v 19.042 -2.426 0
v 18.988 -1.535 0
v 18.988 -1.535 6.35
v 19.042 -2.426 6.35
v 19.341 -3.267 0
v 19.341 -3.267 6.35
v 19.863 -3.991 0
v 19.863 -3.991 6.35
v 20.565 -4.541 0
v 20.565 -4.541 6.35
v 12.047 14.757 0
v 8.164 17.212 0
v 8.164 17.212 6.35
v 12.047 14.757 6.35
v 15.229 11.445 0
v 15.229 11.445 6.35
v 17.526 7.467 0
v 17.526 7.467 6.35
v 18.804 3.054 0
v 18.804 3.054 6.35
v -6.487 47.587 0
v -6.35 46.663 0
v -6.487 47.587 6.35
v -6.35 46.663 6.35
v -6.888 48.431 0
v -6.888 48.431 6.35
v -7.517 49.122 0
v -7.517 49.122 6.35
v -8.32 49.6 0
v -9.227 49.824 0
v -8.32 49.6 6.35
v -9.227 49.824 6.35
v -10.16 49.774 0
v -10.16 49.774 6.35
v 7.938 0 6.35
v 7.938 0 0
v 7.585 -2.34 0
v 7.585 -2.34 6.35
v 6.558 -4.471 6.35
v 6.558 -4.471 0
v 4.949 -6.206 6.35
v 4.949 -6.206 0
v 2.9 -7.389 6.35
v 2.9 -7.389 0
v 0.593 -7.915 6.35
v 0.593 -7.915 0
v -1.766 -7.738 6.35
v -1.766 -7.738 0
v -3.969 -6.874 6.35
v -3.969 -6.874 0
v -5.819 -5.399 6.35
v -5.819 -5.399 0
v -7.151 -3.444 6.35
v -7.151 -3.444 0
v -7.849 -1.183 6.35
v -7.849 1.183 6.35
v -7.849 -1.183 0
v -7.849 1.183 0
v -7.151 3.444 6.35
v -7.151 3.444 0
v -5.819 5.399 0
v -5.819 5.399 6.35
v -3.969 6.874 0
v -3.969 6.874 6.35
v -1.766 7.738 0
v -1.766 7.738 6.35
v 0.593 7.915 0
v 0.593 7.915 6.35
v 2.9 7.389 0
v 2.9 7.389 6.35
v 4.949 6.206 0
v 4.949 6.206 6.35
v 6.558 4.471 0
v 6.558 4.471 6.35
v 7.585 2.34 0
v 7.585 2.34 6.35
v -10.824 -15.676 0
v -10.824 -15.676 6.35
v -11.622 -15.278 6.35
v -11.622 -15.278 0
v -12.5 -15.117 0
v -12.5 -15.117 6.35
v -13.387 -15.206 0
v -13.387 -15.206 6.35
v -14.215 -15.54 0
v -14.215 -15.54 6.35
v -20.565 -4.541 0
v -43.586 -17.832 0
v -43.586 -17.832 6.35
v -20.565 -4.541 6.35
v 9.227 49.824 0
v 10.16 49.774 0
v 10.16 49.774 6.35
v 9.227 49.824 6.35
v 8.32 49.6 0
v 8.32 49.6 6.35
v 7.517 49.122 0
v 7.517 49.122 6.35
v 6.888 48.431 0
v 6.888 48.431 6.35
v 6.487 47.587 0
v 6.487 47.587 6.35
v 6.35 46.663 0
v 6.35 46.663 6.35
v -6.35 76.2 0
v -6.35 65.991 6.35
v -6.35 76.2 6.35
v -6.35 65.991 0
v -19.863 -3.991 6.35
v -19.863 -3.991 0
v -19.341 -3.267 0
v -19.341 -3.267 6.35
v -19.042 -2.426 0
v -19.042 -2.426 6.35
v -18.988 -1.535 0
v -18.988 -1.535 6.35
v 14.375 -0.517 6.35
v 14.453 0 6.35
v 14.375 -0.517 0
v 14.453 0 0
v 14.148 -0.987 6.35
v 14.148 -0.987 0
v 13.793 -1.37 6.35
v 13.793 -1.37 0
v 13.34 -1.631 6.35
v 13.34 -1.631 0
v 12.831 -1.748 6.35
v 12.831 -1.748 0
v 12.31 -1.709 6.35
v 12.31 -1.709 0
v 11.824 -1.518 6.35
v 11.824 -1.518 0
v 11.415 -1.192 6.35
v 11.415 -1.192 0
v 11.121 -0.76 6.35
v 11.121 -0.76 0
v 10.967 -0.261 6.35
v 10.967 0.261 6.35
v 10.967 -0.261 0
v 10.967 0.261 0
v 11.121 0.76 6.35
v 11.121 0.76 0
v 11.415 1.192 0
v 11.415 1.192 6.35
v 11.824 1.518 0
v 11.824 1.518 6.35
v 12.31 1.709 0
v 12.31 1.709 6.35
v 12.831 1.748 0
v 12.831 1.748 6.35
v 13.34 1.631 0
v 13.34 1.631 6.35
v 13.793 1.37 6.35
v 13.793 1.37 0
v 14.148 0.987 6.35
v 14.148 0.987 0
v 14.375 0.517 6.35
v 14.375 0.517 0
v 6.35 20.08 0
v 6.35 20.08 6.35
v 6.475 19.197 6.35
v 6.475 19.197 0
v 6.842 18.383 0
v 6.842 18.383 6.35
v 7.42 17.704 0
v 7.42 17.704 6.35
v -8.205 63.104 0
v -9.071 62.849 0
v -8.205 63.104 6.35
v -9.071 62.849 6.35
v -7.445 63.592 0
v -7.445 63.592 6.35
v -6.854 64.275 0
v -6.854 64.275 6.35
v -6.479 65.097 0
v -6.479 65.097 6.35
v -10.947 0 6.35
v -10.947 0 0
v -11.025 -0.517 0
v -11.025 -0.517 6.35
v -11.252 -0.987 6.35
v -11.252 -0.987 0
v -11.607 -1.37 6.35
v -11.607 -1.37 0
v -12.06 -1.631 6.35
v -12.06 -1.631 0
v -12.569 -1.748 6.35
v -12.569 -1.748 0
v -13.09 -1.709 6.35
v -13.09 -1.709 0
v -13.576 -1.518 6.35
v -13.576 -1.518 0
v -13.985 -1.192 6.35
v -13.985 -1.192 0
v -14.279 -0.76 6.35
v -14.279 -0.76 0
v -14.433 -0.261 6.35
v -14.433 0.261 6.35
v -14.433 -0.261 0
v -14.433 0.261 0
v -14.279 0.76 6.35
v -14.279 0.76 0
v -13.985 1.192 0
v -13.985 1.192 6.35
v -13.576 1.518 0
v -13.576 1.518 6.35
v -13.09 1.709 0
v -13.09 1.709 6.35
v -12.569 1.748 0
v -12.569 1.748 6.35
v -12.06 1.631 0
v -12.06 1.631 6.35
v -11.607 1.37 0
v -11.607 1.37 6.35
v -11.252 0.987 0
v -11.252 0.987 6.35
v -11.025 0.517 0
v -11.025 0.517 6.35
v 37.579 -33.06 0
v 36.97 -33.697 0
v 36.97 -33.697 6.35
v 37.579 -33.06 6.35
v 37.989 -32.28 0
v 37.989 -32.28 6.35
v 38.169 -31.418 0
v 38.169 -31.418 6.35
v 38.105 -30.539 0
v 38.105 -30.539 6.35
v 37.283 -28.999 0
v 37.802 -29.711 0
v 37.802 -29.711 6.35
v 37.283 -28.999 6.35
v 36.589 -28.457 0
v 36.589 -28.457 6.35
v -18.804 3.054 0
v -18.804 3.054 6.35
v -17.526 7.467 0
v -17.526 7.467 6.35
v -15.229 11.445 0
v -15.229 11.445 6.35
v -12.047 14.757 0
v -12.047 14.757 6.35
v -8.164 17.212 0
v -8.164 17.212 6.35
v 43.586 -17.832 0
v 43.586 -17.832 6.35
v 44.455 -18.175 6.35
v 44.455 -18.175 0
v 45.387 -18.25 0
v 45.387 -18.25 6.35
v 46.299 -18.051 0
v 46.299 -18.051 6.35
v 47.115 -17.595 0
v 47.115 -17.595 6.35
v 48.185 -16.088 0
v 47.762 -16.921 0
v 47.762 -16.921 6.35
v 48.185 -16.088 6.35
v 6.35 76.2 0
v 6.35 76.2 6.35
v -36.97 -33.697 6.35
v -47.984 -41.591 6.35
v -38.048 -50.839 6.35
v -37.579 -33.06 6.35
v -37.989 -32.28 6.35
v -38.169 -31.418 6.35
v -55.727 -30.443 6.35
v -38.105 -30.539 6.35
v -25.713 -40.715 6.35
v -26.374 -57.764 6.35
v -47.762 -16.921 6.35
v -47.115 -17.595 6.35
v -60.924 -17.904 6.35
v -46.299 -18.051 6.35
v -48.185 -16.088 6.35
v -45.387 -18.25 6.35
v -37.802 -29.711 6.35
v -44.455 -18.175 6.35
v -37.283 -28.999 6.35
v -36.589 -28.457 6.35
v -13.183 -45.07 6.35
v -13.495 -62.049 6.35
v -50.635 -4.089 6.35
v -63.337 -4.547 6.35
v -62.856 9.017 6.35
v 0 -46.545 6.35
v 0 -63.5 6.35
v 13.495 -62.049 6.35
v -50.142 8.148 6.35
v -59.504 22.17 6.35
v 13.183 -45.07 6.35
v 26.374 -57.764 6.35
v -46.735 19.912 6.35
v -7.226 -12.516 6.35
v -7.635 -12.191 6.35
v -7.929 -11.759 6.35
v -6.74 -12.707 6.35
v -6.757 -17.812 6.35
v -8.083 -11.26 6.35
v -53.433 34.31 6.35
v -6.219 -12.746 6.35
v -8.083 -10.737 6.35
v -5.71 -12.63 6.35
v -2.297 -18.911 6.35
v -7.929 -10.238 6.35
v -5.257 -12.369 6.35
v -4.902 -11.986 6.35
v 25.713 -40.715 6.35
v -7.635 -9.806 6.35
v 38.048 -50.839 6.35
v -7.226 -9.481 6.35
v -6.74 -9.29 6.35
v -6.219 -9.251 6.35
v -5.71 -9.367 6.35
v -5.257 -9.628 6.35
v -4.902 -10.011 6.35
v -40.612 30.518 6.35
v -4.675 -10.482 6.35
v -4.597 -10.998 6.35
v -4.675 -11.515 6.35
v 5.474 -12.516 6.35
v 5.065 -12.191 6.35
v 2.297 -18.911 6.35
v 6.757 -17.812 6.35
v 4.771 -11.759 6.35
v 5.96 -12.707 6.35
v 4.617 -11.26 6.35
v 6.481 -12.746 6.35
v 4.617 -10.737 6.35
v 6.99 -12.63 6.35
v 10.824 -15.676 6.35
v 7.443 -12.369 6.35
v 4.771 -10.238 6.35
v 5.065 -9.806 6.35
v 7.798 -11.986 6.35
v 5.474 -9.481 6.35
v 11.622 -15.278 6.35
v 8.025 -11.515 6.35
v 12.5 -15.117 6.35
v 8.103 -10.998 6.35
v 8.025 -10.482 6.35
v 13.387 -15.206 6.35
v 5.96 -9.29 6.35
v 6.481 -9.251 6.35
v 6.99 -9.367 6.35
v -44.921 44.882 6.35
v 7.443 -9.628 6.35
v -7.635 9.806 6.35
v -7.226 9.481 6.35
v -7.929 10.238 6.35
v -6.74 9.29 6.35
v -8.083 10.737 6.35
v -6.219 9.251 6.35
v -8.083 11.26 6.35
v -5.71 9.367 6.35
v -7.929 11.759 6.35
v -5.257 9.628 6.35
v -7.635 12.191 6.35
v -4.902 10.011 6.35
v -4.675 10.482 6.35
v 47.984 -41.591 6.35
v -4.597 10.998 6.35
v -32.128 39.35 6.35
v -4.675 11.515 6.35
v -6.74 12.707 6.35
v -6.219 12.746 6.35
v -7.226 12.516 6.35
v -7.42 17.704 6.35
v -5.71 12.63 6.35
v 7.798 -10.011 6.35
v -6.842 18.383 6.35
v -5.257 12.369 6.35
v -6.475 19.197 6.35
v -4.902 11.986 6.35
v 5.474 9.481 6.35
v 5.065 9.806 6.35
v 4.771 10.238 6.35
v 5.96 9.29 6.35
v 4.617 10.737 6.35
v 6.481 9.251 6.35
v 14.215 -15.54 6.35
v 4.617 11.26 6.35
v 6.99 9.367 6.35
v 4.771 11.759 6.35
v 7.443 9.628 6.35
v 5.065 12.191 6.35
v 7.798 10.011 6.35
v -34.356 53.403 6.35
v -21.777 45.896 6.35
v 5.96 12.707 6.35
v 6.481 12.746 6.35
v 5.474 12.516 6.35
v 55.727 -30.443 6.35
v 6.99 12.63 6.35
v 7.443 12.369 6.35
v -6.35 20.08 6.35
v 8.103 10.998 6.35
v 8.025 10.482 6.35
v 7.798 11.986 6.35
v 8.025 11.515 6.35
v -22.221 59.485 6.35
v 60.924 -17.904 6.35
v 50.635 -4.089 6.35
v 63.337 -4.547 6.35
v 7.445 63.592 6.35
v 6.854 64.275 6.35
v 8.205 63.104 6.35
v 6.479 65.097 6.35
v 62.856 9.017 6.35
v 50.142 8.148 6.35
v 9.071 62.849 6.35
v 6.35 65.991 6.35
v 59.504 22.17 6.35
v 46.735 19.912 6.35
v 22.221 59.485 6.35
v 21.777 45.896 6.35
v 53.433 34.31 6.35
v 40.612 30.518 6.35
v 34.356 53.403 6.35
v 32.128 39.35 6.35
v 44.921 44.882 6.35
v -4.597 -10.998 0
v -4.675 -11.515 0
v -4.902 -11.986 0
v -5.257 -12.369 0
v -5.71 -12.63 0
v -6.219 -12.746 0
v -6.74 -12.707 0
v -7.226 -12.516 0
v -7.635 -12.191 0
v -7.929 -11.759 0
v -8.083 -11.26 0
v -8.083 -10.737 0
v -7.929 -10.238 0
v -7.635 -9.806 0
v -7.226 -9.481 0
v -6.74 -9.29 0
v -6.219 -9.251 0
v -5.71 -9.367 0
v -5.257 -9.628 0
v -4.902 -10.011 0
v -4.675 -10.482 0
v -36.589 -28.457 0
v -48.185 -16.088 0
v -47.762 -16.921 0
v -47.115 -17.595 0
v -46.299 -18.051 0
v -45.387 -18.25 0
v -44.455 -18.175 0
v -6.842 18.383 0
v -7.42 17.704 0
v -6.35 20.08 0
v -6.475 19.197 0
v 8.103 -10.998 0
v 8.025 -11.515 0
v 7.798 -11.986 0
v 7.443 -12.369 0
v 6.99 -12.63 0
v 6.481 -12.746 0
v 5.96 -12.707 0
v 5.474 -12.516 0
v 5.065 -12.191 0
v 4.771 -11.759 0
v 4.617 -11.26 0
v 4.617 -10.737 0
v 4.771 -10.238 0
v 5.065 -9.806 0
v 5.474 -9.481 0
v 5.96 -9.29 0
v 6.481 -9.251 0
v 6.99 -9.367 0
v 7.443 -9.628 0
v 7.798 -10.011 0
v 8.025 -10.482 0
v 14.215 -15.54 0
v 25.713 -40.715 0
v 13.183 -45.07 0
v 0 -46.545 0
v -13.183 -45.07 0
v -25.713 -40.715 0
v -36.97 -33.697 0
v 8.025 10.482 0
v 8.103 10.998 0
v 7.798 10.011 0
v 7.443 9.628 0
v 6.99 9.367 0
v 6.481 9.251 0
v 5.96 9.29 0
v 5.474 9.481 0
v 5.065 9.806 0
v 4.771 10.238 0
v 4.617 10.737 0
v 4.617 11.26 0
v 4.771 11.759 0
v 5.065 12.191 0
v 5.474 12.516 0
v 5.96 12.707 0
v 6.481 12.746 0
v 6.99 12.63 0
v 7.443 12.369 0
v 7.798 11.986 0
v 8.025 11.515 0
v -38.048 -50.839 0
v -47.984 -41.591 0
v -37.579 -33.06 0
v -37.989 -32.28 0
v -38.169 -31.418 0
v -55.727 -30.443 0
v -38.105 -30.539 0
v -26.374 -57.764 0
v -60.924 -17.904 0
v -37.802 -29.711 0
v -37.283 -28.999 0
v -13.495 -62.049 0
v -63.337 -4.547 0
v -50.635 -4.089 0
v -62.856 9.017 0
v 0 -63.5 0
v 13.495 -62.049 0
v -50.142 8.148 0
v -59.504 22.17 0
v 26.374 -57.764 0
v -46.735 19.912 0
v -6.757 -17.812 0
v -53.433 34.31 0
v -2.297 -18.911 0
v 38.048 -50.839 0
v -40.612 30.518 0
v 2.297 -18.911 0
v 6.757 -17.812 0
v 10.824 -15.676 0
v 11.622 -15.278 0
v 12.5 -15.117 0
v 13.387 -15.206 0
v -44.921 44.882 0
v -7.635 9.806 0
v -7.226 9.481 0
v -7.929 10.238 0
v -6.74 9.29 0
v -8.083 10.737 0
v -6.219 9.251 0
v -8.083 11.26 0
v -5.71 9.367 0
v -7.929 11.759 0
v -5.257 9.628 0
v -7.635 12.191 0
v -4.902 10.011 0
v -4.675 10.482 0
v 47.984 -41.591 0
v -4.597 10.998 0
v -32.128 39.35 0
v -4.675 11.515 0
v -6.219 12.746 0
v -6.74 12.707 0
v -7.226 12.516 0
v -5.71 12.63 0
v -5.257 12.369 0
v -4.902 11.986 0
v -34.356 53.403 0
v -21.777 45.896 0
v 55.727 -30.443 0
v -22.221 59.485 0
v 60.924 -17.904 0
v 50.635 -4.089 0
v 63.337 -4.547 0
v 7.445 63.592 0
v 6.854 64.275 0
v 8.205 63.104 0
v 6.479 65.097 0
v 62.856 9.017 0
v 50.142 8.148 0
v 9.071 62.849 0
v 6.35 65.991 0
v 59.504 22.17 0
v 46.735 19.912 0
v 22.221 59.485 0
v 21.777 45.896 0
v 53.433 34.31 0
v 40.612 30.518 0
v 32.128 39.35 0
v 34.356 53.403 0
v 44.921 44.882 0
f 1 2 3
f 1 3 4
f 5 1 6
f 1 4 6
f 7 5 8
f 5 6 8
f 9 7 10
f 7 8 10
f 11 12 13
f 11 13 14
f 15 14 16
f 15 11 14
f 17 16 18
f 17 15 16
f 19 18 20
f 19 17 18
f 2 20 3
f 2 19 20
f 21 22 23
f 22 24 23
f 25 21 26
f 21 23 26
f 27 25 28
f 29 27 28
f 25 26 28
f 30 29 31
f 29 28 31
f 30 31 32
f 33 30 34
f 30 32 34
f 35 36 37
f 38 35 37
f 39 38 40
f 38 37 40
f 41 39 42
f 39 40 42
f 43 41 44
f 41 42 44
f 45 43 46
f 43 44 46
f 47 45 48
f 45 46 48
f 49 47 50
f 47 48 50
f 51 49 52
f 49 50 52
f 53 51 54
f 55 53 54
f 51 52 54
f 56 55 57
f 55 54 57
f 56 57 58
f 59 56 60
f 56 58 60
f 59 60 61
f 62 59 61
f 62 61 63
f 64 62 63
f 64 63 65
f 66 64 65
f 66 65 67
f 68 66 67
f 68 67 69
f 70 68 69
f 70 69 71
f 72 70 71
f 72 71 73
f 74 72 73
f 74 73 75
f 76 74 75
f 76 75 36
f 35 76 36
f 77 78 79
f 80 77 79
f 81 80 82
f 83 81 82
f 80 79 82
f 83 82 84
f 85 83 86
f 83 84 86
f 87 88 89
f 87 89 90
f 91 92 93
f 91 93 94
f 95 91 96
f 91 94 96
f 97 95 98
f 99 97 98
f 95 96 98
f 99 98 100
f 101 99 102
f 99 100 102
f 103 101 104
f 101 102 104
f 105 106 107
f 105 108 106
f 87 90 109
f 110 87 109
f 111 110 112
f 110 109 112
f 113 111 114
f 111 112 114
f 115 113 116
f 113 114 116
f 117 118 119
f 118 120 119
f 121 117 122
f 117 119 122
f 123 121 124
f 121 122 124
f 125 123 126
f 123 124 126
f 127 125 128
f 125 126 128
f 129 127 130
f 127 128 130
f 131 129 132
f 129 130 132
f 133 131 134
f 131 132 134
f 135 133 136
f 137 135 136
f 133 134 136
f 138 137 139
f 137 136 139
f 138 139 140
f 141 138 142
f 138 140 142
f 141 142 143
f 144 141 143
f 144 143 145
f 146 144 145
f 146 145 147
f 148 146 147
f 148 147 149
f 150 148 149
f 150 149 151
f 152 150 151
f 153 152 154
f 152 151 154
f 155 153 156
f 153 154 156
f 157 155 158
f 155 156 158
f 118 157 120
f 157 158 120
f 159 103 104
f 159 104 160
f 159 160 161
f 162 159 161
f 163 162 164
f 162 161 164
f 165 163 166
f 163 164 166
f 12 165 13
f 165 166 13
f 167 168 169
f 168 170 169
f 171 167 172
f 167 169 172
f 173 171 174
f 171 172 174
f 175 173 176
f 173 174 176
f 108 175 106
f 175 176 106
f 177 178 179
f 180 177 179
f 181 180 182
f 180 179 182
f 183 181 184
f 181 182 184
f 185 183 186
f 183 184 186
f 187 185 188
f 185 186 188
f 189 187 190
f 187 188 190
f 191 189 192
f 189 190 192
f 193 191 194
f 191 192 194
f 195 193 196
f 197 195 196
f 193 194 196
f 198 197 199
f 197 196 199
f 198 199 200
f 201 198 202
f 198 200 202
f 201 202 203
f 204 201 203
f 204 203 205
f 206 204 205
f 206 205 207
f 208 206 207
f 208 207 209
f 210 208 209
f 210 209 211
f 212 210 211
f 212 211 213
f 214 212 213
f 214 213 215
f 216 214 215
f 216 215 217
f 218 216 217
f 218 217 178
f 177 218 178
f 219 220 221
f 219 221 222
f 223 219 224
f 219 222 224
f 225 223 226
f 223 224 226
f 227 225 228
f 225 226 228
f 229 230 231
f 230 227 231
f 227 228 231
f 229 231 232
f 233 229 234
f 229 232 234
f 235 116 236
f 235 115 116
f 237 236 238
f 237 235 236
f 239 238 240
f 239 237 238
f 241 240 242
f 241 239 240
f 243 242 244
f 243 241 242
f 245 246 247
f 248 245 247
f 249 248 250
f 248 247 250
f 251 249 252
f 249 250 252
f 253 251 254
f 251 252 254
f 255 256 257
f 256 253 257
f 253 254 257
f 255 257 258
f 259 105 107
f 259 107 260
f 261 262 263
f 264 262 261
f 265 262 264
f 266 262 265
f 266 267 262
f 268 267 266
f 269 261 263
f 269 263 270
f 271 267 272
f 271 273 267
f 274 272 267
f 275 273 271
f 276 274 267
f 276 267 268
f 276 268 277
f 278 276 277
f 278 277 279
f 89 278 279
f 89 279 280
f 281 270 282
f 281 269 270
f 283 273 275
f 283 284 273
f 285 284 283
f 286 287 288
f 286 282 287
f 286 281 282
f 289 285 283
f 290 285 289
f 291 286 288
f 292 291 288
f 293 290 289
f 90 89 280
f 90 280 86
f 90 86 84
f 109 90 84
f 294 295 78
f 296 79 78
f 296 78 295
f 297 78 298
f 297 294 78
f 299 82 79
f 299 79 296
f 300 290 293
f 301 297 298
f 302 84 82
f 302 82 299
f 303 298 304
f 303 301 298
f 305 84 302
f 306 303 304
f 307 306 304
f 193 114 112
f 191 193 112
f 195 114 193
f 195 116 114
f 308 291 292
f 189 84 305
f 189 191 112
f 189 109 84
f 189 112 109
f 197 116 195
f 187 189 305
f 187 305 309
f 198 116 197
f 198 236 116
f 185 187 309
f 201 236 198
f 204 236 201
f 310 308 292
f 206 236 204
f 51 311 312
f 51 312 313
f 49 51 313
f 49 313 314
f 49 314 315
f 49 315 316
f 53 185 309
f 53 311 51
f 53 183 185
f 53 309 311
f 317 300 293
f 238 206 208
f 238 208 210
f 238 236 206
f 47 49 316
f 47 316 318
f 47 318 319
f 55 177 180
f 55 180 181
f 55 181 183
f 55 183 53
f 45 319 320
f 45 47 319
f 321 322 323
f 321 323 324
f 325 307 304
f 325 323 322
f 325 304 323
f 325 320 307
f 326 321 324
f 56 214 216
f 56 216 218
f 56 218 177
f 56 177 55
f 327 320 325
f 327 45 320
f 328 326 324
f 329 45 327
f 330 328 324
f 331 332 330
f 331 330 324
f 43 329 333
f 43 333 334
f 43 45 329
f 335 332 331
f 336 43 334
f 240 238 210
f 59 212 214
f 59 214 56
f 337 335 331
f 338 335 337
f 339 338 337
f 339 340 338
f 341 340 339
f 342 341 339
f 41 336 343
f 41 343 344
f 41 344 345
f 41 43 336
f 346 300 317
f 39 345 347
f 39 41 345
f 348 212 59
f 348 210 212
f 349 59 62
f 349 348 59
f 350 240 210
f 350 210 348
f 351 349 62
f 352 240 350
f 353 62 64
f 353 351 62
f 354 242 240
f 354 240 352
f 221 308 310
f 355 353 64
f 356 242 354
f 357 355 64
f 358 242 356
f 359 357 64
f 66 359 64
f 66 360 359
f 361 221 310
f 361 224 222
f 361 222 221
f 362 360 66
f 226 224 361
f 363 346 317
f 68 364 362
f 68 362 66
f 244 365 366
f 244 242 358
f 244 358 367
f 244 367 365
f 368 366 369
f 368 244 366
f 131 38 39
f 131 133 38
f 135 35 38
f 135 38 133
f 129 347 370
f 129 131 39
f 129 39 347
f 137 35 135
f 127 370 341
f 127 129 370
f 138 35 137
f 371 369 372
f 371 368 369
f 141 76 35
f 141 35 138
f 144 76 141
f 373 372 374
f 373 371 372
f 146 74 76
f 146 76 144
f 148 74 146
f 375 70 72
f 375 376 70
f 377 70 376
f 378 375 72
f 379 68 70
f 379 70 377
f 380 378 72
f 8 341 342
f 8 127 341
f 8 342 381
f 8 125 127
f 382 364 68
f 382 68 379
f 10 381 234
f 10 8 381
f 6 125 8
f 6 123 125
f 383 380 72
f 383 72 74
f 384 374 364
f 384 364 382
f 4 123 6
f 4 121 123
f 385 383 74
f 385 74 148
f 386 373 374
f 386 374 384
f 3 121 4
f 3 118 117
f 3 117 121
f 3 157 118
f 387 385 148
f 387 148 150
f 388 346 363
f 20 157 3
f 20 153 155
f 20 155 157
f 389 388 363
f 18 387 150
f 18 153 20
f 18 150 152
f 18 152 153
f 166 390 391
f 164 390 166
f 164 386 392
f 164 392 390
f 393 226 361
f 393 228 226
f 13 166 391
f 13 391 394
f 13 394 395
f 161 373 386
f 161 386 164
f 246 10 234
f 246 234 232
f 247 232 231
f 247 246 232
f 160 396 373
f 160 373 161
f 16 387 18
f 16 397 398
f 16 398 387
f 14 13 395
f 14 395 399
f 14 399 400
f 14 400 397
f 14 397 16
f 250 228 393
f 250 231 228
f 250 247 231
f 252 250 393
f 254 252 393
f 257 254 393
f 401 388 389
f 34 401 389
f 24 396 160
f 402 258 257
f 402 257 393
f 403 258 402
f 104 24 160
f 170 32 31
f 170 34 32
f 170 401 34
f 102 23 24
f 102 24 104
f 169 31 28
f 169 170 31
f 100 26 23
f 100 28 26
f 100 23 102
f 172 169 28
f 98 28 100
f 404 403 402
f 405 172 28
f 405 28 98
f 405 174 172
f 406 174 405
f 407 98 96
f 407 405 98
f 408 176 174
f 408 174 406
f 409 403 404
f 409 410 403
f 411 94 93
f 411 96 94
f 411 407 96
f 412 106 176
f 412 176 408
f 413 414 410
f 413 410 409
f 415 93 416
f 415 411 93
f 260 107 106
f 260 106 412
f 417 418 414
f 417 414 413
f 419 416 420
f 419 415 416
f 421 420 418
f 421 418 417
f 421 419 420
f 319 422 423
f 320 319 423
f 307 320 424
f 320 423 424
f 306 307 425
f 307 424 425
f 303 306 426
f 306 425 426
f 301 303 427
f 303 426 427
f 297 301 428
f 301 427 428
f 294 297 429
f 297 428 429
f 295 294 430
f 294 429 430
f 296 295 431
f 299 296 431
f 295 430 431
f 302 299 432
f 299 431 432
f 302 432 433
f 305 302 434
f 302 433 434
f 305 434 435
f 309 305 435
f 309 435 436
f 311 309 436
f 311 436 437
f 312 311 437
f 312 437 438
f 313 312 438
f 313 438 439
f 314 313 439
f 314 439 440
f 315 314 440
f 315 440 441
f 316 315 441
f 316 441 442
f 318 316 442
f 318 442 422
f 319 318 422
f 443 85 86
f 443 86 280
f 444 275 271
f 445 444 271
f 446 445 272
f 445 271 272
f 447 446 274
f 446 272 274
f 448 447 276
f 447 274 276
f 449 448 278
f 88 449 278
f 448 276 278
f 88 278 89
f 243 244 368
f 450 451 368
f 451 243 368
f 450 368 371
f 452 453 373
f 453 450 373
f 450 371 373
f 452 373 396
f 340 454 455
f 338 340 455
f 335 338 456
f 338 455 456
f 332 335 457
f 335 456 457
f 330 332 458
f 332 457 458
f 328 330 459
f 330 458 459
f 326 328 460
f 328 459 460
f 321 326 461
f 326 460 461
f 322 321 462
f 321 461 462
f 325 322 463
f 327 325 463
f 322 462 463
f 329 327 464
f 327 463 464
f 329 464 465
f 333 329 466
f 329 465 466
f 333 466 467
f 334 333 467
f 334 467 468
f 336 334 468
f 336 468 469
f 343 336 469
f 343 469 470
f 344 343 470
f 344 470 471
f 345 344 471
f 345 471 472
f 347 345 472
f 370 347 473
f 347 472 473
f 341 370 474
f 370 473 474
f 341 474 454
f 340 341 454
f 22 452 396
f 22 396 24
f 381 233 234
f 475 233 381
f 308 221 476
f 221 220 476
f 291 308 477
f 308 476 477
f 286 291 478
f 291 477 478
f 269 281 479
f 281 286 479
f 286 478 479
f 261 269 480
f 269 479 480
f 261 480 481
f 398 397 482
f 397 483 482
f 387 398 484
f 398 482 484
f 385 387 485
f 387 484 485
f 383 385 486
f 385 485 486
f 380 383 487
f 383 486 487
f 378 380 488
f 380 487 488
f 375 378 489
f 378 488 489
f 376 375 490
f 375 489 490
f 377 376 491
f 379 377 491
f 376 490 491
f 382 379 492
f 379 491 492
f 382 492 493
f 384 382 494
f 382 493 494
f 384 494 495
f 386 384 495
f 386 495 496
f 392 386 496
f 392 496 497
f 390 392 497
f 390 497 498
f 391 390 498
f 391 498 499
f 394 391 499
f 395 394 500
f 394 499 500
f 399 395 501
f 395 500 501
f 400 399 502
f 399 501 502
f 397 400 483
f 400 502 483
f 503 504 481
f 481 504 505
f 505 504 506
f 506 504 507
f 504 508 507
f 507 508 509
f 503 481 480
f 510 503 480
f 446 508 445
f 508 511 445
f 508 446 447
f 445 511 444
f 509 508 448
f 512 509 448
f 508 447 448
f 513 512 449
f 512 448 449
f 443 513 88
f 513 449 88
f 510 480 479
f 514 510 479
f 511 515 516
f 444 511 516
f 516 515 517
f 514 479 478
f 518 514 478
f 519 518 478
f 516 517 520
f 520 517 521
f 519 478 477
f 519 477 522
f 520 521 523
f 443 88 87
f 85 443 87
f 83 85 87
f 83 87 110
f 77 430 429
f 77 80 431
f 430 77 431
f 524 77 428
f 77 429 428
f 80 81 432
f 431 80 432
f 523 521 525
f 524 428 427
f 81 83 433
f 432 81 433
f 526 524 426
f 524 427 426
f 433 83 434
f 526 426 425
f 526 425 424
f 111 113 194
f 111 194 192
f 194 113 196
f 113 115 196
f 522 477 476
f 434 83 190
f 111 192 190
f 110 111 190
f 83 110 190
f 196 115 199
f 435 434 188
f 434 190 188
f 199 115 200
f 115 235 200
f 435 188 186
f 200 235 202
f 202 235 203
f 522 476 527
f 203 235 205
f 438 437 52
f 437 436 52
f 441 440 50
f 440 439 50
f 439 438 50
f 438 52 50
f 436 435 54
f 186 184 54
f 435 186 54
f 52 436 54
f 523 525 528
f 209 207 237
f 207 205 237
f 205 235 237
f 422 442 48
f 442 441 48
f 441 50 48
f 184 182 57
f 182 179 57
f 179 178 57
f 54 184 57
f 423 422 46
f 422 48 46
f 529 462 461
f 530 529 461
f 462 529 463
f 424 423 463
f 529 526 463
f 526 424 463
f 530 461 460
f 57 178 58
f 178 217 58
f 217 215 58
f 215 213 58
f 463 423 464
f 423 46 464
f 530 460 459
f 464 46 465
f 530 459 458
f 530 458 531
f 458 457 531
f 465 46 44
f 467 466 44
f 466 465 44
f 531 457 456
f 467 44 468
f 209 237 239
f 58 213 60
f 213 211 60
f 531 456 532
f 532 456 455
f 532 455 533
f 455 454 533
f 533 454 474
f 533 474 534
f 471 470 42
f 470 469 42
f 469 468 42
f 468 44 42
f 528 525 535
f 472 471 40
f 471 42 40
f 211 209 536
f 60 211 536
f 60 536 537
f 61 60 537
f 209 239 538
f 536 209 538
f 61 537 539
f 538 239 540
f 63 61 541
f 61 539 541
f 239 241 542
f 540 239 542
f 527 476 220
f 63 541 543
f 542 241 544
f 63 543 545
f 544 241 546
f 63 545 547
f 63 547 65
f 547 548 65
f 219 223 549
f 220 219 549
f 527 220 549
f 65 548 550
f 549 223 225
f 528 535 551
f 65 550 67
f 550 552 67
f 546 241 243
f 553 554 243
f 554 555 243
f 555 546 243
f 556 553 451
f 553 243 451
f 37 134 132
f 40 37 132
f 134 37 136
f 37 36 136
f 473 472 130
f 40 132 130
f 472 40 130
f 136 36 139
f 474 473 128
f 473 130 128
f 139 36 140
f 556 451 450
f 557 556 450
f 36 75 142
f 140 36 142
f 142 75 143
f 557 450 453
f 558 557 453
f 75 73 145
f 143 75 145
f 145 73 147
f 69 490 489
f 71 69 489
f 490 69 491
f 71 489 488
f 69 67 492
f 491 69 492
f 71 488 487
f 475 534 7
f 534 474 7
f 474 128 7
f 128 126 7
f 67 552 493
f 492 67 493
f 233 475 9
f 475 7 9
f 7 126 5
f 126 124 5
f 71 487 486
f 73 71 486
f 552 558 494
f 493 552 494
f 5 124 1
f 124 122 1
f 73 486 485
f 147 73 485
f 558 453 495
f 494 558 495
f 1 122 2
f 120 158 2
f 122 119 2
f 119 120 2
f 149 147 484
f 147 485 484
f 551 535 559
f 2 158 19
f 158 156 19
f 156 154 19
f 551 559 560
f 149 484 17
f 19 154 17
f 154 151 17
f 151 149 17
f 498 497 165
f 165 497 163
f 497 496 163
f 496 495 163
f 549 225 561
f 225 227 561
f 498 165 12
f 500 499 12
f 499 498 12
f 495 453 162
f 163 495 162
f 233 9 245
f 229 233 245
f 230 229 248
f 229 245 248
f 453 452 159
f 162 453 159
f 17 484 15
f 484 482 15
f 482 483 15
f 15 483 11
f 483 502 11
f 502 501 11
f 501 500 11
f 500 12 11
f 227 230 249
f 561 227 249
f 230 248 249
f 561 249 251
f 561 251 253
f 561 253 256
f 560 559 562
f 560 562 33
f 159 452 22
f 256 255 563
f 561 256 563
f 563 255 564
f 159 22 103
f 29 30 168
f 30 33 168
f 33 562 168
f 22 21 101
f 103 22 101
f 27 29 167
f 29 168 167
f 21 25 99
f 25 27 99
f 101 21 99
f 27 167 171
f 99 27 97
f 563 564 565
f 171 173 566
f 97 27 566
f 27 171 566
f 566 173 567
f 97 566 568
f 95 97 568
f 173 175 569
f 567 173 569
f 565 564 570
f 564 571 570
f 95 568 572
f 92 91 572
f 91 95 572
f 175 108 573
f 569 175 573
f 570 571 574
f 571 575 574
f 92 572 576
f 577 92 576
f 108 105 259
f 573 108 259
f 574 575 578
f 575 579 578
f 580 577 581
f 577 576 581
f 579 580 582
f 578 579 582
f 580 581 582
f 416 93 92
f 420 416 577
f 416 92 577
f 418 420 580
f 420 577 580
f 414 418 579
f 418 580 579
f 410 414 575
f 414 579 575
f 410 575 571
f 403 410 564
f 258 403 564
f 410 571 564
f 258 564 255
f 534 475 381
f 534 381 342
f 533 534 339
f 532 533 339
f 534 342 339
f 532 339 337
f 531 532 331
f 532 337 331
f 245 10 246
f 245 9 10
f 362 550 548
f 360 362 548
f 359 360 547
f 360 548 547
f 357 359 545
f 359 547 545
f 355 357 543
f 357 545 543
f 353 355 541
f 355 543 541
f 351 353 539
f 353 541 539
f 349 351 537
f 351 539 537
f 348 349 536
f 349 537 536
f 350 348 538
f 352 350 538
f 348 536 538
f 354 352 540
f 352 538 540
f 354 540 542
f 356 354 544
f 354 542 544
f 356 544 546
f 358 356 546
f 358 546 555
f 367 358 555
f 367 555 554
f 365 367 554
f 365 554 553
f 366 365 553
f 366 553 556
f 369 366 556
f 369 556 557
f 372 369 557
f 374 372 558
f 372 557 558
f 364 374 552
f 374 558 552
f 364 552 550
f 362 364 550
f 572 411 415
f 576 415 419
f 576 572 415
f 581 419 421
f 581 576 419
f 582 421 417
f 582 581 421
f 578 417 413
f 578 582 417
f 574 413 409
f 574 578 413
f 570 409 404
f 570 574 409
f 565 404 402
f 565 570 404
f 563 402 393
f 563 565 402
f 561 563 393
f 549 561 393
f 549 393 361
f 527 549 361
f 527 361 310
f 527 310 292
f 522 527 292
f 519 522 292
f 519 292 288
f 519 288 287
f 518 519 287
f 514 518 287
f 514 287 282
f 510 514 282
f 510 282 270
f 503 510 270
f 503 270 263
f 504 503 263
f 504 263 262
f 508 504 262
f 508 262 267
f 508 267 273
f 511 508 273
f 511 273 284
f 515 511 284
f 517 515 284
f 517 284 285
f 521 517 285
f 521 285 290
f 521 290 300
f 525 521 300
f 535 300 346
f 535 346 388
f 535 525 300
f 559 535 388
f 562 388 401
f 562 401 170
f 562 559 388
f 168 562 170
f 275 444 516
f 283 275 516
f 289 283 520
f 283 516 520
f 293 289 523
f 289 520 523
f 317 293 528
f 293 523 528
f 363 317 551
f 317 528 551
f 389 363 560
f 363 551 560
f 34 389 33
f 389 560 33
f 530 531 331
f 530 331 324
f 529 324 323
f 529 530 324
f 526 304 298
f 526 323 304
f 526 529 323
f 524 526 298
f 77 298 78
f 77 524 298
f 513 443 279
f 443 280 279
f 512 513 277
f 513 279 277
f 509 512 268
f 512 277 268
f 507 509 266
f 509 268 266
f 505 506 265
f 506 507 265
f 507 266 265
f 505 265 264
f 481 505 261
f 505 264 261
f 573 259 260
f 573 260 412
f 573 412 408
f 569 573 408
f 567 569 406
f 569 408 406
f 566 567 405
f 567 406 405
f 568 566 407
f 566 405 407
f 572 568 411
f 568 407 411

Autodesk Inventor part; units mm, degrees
ref_plane "YZ Plane" through (0, 0, 0) normal (1, 0, 0) x (0, 1, 0)
ref_plane "XZ Plane" through (0, 0, 0) normal (0, 1, 0) x (-1, 0, 0)
ref_plane "XY Plane" through (0, 0, 0) normal (0, 0, 1) x (1, 0, 0)
sketch "Sketch1" plane through (0, 0, 0) normal (0, 0, 1) x (1, 0, 0)
  circle A0 centre (0, 0) radius 63.5
  line L0 (0, 0) -> (0, 63.5) construction
  line L1 (-6.35, 76.2) -> (6.35, 76.2)
  line L2 (6.35, 76.2) -> (6.35, 0)
  line L3 (6.35, 0) -> (-6.35, 0) construction
  line L4 (-6.35, 0) -> (-6.35, 76.2)
  line L5 (-6.35, 76.2) -> (6.35, 0) construction
  line L6 (6.35, 76.2) -> (-6.35, 0) construction
  circle A1 centre (0, 0) radius 50.8
  circle A2 centre (0, 0) radius 19.05
  line L7 (-69.1661, -32.6007) -> (-3.175, 5.4993)
  line L8 (3.175, -5.4993) -> (-62.8161, -43.5993)
  line L9 (62.8161, -43.5993) -> (-3.175, -5.4993)
  line L10 (3.175, 5.4993) -> (69.1661, -32.6007)
  circle A3 centre (0, 0) radius 12.7 construction
  circle A4 centre (6.35, 10.9985) radius 1.7526
  line L11 (0, 0) -> (6.35, 10.9985) construction
  circle A5 centre (-6.35, 10.9985) radius 1.7526
  circle A6 centre (-12.7, 0) radius 1.7526
  circle A7 centre (-6.35, -10.9985) radius 1.7526
  circle A8 centre (6.35, -10.9985) radius 1.7526
  circle A9 centre (12.7, 0) radius 1.7526
  circle A10 centre (0, 0) radius 7.9375
  circle A11 centre (0, 57.15) radius 3.175
  arc A12 (-40.474, -30.7) -> (40.474, -30.7) centre (0, 13.0686) ccw
  point P0 (0, 38.1)
  point P1 (-6.35, 50.4016)
  point P2 (-6.35, 17.9605)
  point P3 (-18.7293, -3.481)
  point P4 (-46.824, -19.7015)
  point P5 (-6.35, 63.1817)
  point P6 (6.35, 63.1817)
  point P7 (-12.3793, -14.4795)
  point P8 (12.3793, -14.4795)
  point P9 (40.474, -30.7)
  point P10 (6.35, 50.4016)
  point P11 (46.824, -19.7015)
  point P12 (18.7293, -3.481)
  point P13 (6.35, 17.9605)
  point P14 (0, -46.5455)
  dimension "d0" = 127
  dimension "d9" = 25.4
  dimension "d1" = 76.2
  dimension "d2" = 12.7
  dimension "d3" = 12.7
  dimension "d4" = 38.1
  dimension "d7" = 360
  dimension "d10" = 3.5052
  dimension "d11" = 30
  dimension "d14" = 360
  dimension "d16" = 15.875
  dimension "d17" = 6.35
  dimension "d18" = 57.15
  dimension "d22" = 46.5455
extrude "Extrusion1" add sketch "Sketch1" along normal blind 6.35 contours A0 L10 A1 L2 | L2 A1 L4 A0 | A0 L4 L1 L2 | A0 L9 A1 L10 | L4 A1 L7 A0 | L2 A2 L4 A1 | A0 L8 A1 L9 | A1 L9 A2 L10 | L7 A1 L8 A0 | A2 L10 A9 A10 L2 A4 | L2 A4 A10 L4 A5 A2 | A1 A12 | A2 L9 A8 A10 L10 A9 | L7 A2 L8 A1 | L4 A5 A10 L7 A6 A2 | A2 L8 A7 A10 L9 A8 | L7 A6 A10 L8 A7 A2 | A11
fillet "Fillet1" radius 3.175 14 edges at (6.35, 50.4016, 3.175) (6.35, 17.9605, 3.175) (18.7293, -3.481, 3.175) (46.824, -19.7015, 3.175) (12.3793, -14.4795, 3.175) (-12.3793, -14.4795, 3.175) (-18.7293, -3.481, 3.175) (-6.35, 17.9605, 3.175) (-46.824, -19.7015, 3.175) (-6.35, 50.4016, 3.175) (-6.35, 63.1817, 3.175) (6.35, 63.1817, 3.175) (40.474, -30.7, 3.175) (-40.474, -30.7, 3.175)
properties part number "Emma Blade"
